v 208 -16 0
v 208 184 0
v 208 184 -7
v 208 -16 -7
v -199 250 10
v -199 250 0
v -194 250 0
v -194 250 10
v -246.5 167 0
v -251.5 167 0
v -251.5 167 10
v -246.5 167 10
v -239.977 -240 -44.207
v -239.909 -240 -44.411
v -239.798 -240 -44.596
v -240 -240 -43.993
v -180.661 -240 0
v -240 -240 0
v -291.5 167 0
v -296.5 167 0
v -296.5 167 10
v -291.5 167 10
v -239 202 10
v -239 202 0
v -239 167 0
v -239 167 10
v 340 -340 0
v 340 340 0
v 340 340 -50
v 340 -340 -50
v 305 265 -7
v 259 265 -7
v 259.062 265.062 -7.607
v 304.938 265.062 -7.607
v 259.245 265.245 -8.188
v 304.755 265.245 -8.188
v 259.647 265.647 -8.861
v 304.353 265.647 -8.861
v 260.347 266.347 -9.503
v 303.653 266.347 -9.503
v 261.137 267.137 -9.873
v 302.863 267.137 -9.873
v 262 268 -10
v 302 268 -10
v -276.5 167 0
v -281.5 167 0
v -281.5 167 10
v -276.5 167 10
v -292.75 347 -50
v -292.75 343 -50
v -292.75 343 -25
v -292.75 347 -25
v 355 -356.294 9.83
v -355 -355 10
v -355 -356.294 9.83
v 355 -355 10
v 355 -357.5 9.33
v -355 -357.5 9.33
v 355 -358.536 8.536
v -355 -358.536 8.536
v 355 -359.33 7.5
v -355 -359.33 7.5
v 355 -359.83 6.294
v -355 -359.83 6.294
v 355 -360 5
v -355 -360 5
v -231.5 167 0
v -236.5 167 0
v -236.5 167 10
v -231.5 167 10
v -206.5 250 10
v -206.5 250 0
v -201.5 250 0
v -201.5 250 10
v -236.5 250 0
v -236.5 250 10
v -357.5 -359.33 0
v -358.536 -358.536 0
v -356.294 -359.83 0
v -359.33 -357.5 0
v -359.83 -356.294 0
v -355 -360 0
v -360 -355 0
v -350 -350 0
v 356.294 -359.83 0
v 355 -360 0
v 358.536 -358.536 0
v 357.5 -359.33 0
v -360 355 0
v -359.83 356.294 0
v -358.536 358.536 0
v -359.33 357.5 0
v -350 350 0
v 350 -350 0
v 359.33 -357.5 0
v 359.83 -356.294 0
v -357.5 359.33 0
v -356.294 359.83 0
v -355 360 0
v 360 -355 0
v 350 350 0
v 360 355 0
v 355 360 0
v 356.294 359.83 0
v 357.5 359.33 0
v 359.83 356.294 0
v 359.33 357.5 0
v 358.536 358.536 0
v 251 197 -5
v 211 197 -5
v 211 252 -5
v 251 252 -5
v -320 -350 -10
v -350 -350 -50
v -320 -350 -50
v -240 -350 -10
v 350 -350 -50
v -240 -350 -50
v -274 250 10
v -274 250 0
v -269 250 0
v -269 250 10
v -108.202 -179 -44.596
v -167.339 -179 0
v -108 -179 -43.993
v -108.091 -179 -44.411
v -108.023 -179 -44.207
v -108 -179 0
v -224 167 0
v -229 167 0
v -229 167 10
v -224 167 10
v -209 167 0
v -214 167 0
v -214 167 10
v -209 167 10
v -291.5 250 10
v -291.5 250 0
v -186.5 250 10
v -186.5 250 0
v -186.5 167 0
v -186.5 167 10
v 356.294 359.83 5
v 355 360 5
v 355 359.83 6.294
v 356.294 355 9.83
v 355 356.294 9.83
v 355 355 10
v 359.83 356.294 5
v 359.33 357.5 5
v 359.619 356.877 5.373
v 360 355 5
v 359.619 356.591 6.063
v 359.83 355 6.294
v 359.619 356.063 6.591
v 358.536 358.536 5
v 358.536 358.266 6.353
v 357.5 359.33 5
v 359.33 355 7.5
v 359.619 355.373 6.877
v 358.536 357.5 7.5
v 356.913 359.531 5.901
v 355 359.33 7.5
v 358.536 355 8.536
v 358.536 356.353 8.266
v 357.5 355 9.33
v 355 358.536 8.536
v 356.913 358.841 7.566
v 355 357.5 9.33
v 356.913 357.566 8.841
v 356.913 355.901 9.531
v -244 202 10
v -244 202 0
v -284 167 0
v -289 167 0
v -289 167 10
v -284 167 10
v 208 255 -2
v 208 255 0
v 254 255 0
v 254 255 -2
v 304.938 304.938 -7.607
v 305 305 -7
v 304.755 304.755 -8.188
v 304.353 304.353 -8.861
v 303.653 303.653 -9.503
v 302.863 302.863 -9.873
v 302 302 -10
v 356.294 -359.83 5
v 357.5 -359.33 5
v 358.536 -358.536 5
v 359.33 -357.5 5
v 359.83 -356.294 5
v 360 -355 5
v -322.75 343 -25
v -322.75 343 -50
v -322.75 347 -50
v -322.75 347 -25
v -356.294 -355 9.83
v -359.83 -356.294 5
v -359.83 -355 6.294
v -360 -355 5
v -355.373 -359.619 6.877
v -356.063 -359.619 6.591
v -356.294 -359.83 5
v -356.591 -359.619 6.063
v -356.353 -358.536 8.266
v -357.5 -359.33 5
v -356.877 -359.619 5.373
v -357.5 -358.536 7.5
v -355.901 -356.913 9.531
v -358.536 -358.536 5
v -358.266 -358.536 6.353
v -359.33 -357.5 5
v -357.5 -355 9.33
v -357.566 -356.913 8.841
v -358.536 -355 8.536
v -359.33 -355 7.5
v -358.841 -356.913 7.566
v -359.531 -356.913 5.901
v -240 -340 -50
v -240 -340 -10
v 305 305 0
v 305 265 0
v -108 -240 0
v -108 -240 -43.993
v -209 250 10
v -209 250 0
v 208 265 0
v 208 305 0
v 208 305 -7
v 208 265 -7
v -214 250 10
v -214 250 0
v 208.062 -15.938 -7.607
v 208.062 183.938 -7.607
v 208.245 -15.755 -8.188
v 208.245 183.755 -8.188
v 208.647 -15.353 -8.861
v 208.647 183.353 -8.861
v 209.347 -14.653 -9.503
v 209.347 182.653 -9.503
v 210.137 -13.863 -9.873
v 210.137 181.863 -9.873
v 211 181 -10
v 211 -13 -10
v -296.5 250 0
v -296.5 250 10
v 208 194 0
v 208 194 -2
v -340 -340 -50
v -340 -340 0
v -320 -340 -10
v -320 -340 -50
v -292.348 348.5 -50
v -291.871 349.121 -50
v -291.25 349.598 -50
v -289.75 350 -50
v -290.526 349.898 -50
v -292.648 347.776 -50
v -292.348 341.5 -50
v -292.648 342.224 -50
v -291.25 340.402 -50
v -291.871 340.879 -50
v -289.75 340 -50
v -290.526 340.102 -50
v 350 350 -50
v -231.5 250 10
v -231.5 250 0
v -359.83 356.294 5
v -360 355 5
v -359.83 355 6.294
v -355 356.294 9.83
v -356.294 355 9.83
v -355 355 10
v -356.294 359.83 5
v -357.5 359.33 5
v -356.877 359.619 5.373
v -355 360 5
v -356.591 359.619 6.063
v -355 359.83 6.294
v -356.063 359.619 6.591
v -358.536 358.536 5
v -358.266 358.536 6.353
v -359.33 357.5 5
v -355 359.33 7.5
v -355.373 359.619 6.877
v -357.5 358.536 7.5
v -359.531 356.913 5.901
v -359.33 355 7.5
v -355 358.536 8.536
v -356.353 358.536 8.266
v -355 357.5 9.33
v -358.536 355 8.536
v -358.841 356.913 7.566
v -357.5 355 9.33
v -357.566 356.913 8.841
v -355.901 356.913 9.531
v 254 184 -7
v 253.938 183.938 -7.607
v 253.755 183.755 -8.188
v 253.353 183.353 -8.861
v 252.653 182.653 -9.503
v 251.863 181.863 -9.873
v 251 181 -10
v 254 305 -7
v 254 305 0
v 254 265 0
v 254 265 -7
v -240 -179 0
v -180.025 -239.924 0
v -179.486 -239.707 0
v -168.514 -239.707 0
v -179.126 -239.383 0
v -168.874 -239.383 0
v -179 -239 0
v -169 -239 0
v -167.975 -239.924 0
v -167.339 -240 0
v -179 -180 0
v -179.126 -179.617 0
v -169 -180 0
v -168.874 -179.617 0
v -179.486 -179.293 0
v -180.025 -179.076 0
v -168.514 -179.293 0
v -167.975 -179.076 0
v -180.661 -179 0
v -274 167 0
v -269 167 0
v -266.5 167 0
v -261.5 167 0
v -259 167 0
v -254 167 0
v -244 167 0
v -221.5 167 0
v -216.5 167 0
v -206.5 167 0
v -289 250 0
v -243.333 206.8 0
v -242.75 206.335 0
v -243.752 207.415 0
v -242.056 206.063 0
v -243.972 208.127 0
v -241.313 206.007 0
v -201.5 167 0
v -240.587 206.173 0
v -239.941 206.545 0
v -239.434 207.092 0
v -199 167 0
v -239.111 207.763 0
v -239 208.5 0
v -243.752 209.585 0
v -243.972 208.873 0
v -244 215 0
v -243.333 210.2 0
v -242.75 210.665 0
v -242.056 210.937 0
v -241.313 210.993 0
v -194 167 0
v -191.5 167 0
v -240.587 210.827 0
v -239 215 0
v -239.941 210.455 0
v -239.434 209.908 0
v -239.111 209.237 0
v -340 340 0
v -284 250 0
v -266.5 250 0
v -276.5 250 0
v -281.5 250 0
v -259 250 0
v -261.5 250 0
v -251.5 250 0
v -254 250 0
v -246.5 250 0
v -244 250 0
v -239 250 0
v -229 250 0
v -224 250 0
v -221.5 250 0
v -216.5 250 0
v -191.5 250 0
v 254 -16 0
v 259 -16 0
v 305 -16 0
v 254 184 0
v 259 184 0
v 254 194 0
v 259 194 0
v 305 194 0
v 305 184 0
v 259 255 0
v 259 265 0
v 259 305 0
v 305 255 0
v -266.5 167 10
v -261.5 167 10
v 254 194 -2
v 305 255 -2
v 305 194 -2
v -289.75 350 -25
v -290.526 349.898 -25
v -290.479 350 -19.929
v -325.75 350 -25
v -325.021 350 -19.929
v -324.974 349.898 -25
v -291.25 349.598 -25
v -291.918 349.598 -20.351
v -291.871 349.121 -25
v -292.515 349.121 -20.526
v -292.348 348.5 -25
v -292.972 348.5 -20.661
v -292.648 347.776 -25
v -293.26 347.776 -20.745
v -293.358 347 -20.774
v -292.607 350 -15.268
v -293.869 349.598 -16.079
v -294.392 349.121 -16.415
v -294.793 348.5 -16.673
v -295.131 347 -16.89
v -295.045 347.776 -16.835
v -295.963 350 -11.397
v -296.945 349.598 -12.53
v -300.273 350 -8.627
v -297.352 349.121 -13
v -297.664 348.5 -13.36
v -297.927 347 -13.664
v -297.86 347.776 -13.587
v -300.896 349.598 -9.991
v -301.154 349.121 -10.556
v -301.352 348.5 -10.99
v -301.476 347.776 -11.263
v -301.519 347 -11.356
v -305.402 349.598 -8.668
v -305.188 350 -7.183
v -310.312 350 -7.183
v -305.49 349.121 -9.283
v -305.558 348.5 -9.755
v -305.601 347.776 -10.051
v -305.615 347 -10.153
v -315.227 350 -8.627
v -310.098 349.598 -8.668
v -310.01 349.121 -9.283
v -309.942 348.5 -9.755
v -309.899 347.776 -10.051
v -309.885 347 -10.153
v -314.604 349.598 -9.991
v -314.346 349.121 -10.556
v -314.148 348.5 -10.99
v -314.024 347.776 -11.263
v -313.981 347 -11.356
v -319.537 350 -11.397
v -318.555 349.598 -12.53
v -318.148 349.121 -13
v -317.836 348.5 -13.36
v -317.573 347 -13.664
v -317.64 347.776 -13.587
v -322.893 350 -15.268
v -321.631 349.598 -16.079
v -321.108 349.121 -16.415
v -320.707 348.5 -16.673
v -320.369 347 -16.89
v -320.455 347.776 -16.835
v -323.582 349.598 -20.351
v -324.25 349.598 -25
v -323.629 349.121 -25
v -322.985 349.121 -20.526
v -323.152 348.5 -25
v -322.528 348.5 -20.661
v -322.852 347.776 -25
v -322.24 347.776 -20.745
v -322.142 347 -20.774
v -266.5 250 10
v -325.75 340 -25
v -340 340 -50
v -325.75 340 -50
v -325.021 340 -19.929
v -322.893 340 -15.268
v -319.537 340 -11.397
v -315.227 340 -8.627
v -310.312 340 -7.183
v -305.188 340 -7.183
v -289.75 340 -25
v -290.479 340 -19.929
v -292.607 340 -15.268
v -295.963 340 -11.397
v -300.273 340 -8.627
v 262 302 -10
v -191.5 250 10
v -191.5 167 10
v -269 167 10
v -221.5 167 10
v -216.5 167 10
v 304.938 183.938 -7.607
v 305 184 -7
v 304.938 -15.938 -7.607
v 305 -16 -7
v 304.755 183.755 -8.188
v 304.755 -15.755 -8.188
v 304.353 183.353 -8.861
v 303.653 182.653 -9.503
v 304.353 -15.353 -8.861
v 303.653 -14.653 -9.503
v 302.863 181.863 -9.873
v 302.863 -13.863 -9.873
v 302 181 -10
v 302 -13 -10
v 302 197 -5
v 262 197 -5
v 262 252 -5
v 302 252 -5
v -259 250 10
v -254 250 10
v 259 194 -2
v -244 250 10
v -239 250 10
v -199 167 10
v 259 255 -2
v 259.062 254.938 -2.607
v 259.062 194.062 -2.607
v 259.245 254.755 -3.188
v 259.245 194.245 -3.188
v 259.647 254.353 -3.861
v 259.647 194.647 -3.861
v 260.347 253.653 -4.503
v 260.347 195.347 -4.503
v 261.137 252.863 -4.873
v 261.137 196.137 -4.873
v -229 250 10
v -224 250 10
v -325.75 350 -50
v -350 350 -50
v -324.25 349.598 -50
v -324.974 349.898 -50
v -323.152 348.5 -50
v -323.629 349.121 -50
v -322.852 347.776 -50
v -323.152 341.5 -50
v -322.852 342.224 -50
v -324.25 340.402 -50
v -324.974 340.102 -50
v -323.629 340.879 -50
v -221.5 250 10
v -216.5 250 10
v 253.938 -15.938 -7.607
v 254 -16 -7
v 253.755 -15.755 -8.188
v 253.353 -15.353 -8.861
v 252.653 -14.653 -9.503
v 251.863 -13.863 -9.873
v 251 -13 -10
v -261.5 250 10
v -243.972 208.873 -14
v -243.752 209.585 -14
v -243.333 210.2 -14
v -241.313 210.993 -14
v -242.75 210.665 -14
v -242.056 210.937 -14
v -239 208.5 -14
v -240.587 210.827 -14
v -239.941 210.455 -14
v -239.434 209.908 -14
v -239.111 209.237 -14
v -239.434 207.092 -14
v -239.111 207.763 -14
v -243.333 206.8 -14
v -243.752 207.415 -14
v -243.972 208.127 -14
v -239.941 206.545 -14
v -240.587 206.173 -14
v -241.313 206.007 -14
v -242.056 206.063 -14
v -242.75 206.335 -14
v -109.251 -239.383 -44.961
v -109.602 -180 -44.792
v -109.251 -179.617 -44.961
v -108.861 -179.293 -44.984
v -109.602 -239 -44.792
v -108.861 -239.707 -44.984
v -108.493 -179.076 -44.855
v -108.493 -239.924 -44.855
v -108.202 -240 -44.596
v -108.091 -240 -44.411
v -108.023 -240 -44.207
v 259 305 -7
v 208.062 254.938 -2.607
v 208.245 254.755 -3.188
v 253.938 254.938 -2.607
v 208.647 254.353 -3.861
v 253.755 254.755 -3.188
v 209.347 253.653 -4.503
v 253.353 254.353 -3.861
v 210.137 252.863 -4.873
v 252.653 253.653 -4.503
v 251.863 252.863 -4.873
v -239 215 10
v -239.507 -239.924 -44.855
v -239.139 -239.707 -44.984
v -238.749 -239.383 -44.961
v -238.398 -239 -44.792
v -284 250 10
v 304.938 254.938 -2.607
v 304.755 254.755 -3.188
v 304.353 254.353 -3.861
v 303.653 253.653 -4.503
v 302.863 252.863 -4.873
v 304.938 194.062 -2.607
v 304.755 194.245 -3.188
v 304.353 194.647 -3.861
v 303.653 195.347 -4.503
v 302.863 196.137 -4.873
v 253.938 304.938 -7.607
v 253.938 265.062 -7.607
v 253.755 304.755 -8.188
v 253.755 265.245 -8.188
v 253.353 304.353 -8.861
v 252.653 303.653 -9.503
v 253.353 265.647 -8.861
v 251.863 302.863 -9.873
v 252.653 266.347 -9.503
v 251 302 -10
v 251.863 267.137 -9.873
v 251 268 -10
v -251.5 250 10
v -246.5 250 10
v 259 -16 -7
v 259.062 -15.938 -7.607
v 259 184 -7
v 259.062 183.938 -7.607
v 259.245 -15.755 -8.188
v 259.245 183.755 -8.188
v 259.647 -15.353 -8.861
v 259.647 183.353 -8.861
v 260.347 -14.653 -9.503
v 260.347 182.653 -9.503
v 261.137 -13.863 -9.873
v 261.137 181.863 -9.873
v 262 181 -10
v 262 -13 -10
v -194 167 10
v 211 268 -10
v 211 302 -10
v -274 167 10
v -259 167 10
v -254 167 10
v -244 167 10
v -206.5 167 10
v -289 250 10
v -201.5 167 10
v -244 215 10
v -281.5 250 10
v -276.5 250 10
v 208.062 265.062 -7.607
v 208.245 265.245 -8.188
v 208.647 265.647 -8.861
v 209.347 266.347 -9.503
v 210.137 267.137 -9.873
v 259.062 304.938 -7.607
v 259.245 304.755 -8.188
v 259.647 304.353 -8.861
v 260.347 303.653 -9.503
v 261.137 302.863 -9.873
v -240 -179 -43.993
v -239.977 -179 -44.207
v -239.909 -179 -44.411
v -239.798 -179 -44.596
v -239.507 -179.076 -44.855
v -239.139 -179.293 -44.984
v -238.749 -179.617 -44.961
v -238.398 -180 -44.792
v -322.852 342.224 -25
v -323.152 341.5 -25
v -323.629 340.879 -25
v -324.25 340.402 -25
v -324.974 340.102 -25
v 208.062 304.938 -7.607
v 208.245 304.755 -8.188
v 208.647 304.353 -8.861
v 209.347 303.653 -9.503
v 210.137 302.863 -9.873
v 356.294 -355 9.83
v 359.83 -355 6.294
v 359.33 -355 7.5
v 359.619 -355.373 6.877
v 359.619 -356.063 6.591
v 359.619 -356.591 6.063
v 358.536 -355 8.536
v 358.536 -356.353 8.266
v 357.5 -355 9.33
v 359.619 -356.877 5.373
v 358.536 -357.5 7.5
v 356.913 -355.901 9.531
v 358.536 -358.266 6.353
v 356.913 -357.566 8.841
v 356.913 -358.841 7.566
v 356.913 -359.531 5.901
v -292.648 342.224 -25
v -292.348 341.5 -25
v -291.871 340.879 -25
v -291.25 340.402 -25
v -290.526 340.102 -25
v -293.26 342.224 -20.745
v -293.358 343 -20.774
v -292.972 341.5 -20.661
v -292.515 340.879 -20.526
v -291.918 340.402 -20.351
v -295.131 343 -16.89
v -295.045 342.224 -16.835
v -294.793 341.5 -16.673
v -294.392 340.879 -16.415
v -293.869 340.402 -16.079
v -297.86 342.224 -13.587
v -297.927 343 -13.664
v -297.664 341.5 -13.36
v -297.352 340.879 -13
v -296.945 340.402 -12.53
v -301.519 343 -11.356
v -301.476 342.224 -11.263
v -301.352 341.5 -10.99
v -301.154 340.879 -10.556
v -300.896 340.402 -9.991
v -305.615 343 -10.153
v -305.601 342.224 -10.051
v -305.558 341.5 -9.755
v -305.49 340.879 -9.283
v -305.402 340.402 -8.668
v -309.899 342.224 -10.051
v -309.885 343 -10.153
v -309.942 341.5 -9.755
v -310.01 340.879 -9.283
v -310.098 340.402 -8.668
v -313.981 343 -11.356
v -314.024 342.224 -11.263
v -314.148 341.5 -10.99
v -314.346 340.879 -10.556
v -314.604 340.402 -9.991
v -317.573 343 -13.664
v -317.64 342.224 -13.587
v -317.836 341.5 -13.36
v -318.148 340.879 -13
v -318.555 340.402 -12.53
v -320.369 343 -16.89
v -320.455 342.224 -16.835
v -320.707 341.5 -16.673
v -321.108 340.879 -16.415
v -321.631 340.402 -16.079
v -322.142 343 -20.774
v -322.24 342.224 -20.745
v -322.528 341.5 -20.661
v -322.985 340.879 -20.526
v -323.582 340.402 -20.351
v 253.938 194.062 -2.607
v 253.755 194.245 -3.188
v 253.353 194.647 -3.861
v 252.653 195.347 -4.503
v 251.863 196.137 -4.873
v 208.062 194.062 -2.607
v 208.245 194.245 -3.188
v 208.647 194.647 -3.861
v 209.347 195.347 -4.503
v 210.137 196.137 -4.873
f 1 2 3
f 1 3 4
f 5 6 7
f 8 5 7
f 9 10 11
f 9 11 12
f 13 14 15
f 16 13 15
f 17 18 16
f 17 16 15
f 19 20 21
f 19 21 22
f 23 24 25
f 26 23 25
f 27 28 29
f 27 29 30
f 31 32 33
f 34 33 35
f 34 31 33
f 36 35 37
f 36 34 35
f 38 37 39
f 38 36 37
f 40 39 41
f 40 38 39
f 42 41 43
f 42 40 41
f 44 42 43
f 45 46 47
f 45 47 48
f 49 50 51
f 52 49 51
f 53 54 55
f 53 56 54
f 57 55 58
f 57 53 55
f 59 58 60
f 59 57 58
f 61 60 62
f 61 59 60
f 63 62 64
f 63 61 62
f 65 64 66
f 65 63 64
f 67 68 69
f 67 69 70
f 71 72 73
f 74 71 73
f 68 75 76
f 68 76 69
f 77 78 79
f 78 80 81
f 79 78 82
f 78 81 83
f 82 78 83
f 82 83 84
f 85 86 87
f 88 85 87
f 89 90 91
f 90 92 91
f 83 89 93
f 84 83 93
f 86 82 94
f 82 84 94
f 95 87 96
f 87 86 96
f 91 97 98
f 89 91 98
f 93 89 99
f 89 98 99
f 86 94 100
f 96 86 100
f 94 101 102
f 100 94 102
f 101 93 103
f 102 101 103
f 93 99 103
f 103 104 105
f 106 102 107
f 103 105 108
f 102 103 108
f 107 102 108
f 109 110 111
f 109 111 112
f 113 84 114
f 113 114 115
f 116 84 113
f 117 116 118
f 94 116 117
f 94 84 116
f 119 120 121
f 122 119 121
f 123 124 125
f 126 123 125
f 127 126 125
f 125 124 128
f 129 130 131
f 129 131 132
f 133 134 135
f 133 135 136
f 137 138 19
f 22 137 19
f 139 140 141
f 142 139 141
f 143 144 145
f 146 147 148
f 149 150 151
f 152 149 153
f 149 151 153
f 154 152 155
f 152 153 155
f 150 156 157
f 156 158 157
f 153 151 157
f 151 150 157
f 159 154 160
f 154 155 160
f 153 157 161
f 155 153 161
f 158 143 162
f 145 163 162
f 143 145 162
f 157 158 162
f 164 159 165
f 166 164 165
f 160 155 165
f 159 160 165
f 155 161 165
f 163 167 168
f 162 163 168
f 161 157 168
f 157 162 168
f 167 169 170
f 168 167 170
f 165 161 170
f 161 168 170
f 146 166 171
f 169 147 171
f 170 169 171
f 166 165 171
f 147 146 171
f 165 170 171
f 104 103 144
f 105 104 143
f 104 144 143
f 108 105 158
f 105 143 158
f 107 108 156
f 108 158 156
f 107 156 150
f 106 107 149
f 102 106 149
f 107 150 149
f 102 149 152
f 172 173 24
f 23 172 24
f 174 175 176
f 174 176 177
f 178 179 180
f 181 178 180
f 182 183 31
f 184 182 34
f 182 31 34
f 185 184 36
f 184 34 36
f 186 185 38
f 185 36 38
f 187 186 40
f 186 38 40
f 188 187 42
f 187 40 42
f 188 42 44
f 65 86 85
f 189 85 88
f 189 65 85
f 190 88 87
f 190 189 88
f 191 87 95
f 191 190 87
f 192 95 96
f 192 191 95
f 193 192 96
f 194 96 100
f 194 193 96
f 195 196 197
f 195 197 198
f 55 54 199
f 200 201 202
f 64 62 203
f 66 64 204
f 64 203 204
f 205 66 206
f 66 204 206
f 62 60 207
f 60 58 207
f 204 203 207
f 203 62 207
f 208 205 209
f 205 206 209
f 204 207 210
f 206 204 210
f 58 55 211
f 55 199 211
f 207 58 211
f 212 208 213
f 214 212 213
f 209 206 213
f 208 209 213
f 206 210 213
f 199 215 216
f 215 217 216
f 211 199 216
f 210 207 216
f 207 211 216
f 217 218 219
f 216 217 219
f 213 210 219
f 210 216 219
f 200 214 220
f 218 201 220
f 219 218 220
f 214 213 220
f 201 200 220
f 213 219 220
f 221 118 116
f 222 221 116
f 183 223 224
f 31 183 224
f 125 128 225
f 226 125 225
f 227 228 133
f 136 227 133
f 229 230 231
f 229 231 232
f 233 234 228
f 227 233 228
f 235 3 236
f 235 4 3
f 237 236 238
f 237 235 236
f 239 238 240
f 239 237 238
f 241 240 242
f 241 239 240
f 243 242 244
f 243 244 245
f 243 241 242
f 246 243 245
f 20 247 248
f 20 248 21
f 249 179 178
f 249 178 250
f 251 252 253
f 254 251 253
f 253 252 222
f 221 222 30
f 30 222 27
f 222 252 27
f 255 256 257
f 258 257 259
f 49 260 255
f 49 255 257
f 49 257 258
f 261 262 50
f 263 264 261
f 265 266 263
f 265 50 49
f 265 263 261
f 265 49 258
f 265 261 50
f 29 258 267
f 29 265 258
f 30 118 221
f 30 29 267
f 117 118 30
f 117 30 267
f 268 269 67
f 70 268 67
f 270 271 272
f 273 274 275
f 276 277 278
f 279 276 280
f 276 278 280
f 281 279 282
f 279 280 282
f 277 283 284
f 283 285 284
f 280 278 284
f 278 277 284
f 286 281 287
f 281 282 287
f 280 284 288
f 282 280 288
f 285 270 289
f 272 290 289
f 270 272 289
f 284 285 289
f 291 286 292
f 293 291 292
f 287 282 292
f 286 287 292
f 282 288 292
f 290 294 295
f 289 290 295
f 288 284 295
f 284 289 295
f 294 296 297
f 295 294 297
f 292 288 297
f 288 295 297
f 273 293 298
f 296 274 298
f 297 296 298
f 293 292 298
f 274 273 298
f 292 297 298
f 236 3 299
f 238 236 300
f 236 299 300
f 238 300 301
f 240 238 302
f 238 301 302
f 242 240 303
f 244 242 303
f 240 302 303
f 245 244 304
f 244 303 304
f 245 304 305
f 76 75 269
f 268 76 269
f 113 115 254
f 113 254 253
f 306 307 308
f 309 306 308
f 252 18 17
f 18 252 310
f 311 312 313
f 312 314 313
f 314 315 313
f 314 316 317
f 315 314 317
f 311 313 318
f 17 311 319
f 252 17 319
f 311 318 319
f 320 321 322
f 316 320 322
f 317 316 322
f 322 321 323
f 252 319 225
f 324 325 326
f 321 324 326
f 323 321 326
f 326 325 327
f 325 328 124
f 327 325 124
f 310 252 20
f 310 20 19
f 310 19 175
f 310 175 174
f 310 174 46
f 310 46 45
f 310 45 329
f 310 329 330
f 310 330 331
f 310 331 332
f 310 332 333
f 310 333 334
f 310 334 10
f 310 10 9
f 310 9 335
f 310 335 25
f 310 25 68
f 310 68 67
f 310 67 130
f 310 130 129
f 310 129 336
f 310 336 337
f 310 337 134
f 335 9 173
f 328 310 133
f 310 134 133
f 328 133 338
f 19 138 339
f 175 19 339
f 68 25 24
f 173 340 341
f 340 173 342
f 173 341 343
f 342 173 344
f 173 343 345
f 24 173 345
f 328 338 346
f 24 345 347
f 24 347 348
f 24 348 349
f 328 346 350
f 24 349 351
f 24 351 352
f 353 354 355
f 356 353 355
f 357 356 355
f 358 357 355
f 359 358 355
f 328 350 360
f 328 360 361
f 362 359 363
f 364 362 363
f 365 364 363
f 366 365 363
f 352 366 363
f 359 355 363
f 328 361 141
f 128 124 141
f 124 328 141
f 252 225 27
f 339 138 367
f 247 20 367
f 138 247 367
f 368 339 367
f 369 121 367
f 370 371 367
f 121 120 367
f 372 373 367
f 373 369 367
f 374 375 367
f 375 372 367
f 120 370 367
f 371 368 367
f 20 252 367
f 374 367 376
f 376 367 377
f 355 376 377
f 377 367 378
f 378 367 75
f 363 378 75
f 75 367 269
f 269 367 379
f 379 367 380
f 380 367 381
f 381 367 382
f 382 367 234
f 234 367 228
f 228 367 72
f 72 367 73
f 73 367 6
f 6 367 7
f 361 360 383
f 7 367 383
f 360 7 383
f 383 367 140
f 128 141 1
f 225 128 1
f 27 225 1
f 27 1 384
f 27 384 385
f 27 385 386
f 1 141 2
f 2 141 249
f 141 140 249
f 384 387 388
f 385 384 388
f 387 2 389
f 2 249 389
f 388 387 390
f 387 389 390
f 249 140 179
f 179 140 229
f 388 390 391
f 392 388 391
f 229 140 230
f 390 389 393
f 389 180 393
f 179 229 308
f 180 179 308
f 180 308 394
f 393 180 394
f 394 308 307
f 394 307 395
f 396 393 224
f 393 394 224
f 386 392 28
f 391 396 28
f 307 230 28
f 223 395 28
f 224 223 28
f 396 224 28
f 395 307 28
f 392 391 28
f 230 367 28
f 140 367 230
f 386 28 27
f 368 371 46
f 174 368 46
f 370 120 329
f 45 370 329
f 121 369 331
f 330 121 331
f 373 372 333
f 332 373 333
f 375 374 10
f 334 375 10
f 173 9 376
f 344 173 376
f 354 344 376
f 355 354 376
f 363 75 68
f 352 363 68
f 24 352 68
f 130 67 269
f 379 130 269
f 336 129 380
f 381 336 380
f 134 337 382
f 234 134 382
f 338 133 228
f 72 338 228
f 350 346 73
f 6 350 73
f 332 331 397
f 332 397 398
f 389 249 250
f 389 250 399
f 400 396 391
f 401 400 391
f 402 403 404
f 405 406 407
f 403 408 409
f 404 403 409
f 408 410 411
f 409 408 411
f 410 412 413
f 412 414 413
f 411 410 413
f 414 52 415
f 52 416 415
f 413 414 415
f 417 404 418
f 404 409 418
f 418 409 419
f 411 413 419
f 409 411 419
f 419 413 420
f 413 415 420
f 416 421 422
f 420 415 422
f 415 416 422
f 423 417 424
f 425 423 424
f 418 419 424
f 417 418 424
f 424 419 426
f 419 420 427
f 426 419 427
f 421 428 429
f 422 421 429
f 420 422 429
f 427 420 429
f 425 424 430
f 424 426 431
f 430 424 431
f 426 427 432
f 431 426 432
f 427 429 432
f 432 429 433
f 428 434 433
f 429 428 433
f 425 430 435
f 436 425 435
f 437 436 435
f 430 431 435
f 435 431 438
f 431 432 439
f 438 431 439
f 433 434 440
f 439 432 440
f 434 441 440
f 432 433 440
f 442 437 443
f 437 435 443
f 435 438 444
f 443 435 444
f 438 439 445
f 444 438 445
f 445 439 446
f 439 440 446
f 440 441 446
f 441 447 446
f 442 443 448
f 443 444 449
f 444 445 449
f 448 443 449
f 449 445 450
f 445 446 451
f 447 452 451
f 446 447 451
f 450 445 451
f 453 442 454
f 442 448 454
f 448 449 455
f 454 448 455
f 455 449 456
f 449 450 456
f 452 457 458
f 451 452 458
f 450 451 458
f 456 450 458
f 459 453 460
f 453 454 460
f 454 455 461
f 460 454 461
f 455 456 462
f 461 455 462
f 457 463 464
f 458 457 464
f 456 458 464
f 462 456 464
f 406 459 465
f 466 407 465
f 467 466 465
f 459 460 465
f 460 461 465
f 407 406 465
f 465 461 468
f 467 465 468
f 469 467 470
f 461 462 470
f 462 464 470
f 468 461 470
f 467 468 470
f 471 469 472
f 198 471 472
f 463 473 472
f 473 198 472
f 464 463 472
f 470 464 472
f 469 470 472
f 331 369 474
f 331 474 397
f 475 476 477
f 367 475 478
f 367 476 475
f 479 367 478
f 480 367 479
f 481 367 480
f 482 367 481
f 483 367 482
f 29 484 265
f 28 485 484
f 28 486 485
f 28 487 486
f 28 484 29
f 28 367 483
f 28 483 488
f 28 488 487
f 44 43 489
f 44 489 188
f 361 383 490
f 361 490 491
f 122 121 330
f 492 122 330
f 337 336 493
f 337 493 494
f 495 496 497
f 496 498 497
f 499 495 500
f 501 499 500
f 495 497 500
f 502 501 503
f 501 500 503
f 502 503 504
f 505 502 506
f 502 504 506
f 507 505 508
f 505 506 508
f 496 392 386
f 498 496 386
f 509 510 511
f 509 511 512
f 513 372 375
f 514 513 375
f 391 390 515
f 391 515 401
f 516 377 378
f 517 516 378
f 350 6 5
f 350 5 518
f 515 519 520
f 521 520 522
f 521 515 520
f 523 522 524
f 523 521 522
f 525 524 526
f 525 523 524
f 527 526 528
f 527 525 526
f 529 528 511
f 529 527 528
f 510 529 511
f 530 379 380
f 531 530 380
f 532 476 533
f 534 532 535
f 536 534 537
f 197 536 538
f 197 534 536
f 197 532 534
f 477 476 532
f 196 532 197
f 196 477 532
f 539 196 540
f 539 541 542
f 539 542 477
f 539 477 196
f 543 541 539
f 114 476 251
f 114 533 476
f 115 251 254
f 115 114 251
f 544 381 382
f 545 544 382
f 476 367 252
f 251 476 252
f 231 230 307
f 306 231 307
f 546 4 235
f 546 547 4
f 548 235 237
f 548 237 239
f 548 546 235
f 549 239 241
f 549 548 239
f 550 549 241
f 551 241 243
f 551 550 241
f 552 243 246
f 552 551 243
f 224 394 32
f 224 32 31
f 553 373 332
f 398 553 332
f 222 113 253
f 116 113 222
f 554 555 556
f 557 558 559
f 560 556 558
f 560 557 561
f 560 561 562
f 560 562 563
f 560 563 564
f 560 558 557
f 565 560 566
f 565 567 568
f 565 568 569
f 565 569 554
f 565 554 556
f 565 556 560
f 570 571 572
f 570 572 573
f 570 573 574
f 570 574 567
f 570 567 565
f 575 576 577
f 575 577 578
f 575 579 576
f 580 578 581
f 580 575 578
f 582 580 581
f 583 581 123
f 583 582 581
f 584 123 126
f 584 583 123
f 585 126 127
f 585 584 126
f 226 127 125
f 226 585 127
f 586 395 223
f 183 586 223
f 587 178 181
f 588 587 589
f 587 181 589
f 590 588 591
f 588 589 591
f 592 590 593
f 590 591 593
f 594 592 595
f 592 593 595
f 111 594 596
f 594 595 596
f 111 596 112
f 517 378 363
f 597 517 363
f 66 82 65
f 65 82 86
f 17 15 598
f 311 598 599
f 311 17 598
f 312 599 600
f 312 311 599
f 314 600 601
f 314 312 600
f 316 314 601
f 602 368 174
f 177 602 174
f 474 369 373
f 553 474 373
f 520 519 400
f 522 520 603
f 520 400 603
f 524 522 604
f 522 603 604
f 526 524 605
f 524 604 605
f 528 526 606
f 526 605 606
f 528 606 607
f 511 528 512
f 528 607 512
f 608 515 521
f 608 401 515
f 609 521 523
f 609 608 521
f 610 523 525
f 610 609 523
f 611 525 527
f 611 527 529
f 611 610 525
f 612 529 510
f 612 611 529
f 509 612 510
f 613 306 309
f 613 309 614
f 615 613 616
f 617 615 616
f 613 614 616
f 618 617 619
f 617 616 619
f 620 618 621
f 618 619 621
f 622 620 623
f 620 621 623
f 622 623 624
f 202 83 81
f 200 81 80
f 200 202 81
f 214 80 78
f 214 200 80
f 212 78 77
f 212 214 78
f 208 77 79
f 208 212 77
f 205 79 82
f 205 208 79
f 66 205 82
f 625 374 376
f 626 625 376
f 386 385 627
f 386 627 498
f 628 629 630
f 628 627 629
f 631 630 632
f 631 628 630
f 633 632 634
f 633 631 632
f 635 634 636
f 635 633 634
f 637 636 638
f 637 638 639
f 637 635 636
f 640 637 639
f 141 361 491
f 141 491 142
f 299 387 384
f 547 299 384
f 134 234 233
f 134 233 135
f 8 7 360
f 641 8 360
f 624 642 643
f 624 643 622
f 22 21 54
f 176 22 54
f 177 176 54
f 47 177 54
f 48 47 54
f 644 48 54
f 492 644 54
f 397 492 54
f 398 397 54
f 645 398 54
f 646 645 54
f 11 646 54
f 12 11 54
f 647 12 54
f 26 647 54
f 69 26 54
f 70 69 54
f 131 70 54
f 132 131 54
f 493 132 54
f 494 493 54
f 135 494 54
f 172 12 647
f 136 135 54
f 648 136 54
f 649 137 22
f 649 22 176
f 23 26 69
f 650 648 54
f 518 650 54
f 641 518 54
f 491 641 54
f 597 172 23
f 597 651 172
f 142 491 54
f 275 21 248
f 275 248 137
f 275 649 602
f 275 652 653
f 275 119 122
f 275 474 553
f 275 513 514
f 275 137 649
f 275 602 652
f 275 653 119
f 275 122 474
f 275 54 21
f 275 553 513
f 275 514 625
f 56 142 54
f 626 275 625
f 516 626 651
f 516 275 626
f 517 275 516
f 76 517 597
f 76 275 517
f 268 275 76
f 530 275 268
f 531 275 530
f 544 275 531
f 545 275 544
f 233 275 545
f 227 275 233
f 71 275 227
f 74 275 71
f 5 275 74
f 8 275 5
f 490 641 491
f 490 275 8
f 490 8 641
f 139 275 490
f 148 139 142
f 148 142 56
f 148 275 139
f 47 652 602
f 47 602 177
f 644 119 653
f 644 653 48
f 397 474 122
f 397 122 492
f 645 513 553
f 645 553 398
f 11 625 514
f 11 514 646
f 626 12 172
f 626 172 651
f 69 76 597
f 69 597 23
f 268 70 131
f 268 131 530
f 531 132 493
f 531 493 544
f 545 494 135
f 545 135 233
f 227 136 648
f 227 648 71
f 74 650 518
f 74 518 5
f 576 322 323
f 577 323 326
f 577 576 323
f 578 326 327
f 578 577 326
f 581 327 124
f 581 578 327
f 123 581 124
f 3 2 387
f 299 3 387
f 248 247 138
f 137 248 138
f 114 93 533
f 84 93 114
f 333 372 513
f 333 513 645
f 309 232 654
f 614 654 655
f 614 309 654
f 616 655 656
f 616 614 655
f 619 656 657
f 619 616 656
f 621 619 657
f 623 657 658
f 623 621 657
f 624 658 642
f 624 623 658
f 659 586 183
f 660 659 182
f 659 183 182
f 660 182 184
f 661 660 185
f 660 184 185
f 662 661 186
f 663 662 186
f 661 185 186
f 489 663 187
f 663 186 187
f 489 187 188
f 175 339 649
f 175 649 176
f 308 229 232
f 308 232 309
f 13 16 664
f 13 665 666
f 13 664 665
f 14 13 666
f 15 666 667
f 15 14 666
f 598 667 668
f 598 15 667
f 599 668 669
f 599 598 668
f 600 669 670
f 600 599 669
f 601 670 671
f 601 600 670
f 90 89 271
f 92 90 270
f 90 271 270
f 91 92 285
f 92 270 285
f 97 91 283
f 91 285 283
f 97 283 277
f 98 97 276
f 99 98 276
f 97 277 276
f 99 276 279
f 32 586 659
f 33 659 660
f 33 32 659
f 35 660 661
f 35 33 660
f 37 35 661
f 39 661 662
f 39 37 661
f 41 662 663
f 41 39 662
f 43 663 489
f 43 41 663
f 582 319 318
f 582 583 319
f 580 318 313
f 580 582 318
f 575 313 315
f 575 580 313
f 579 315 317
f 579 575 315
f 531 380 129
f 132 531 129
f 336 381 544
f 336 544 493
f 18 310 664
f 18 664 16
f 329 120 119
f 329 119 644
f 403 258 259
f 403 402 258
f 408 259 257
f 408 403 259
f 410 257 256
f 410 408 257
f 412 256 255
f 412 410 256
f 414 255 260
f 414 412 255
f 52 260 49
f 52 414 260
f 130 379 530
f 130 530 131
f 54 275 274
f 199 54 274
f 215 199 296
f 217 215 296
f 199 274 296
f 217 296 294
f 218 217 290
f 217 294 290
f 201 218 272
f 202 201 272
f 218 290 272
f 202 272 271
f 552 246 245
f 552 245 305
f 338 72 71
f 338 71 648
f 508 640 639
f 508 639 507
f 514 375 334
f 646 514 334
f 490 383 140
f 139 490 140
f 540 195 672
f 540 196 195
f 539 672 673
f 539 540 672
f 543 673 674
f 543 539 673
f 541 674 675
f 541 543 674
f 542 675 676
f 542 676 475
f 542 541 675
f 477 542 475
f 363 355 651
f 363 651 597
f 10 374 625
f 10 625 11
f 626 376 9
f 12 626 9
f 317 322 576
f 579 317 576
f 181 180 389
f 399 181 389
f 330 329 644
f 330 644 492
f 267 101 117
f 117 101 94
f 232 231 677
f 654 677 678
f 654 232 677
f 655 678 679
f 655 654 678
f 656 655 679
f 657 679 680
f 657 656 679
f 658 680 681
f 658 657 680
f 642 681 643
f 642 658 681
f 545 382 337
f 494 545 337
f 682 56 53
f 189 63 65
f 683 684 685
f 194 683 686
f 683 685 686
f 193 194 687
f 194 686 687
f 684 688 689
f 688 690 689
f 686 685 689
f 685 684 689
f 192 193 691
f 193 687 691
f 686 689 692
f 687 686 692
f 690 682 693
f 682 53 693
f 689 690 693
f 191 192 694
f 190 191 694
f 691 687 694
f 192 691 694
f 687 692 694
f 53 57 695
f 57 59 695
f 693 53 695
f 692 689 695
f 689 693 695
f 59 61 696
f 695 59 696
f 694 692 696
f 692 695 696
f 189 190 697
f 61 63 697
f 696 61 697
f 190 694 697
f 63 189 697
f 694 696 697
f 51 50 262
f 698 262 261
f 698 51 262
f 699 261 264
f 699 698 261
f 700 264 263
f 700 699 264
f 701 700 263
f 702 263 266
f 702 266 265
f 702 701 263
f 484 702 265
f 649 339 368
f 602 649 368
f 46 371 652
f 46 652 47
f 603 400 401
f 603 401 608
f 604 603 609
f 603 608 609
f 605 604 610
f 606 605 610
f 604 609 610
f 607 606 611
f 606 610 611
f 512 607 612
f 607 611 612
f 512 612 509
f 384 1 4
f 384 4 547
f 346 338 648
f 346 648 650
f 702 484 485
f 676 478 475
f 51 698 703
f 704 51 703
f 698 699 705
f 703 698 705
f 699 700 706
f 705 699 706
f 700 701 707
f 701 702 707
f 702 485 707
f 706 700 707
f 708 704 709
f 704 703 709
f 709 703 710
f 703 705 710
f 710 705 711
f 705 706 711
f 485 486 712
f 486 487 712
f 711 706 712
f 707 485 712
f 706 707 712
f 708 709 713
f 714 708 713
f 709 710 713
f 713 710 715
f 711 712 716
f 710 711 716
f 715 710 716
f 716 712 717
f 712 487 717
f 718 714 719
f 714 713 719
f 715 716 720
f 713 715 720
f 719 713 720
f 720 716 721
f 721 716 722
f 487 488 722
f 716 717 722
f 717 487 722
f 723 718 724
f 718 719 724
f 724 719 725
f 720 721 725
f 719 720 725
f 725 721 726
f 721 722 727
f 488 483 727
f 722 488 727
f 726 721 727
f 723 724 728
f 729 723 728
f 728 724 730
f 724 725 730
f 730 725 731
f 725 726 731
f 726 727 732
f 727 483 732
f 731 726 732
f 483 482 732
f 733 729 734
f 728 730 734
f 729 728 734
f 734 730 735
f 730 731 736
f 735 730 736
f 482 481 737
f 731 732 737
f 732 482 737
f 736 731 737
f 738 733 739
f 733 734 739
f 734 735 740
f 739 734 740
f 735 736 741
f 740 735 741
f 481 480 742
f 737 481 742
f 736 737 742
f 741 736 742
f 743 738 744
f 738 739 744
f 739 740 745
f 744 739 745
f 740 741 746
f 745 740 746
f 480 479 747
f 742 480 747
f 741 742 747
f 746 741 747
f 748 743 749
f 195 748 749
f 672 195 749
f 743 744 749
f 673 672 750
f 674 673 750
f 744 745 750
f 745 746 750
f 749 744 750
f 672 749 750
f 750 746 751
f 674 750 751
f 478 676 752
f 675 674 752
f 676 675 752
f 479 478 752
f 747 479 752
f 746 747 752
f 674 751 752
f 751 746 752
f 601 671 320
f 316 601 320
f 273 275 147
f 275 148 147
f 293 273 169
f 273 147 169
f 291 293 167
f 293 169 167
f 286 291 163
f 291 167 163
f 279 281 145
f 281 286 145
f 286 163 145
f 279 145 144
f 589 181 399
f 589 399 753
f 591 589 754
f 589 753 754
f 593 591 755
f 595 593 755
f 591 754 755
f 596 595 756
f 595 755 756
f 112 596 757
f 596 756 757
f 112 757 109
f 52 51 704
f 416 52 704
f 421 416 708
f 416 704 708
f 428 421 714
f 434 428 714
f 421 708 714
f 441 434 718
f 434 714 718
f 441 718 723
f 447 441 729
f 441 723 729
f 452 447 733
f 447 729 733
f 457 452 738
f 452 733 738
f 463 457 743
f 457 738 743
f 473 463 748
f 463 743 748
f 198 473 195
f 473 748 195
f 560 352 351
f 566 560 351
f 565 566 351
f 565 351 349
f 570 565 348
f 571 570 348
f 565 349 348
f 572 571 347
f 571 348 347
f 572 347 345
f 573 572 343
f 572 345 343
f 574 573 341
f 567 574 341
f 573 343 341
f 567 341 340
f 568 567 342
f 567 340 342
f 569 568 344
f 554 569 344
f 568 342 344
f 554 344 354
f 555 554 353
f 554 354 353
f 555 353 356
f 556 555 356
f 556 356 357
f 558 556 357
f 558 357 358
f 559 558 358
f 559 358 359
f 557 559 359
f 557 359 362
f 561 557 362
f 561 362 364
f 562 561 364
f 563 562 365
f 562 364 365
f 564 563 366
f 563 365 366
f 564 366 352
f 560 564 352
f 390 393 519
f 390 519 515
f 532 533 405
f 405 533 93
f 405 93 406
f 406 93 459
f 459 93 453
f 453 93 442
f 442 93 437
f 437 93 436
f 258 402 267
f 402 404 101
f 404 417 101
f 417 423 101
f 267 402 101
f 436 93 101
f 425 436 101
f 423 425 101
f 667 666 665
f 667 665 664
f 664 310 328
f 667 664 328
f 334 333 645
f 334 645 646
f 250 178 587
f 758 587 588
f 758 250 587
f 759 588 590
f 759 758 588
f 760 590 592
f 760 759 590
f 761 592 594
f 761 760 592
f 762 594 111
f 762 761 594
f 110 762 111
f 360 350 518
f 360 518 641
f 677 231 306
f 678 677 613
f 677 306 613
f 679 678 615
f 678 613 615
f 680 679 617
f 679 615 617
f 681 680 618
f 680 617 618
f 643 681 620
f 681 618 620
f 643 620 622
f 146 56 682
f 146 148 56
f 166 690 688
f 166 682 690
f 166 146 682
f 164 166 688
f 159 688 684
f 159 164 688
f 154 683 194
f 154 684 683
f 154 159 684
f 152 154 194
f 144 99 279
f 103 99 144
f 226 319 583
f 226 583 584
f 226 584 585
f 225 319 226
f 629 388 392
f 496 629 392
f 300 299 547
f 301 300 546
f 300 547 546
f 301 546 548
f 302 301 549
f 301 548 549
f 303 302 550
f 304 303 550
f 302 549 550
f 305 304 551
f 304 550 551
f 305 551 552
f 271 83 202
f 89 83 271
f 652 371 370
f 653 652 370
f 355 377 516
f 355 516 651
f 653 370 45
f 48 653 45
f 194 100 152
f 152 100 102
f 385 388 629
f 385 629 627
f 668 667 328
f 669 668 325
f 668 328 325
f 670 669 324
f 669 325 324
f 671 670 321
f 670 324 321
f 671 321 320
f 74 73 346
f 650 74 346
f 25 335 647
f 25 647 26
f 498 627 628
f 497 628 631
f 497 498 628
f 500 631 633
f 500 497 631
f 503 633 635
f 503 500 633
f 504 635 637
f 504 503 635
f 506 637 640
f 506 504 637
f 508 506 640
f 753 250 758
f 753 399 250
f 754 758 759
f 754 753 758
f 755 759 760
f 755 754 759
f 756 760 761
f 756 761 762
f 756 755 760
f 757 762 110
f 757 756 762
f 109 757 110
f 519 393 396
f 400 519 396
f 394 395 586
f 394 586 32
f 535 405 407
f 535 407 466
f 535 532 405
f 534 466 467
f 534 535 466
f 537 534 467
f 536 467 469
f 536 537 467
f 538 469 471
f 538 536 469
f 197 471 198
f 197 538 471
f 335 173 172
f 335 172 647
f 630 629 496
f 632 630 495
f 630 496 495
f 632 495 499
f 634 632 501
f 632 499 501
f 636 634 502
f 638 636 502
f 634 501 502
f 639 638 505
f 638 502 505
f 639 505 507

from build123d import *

# Parameters (mm, degrees)
SKETCH_W        = 720
SKETCH_H        = 720
PAD_DEPTH       = 10
SKETCH001_W     = 700
SKETCH001_H     = 700
SKETCH001_W_2   = 680
SKETCH001_H_2   = 680
PAD001_DEPTH    = 50
SKETCH002_W     = 46
SKETCH002_H     = 40
SKETCH002_H_2   = 200
PAD002_DEPTH    = 10
SKETCH003_W     = 46
SKETCH003_H     = 61
PAD003_DEPTH    = 5
SKETCH004_W     = 132
SKETCH004_H     = 61
PAD004_DEPTH    = 46
POCKET_DEPTH    = 61
SKETCH006_R     = 2.5
PAD005_DEPTH    = 14
POCKET001_DEPTH = 10
SKETCH008_W     = 5
SKETCH008_H     = 83
SKETCH008_H_2   = 35
POCKET002_DEPTH = 10
FILLET_R        = 3
FILLET001_R     = 3
FILLET002_R     = 1
FILLET003_R     = 5
SKETCH009_W     = 80
SKETCH009_H     = 40
POCKET003_DEPTH = 10


with BuildPart() as part:
    # Sketch → Pad (new body)
    with BuildSketch(Plane.XY):
        Rectangle(SKETCH_W, SKETCH_H)
    extrude(amount=PAD_DEPTH)

    # Sketch001 (on Face5 of Pad) → Pad001 (join)
    with BuildSketch(Plane(origin=(0, 0, 0), x_dir=(1, 0, 0), z_dir=(0, 0, -1))):
        Rectangle(SKETCH001_W, SKETCH001_H)
        Rectangle(SKETCH001_W_2, SKETCH001_H_2, mode=Mode.SUBTRACT)
    extrude(amount=PAD001_DEPTH)

    # Sketch002 (on Face16 of Pad001) → Pad002 (join)
    with BuildSketch(Plane(origin=(0, 0, 0), x_dir=(1, 0, 0), z_dir=(0, 0, -1))):
        with Locations((282, -285)):
            Rectangle(SKETCH002_W, SKETCH002_H)
        with Locations((231, -285)):
            Rectangle(SKETCH002_W, SKETCH002_H)
        with Locations((282, -84)):
            Rectangle(SKETCH002_W, SKETCH002_H_2)
        with Locations((231, -84)):
            Rectangle(SKETCH002_W, SKETCH002_H_2)
    extrude(amount=PAD002_DEPTH)

    # Sketch003 (on Face16 of Pad002) → Pad003 (join)
    with BuildSketch(Plane(origin=(0, 0, 0), x_dir=(1, 0, 0), z_dir=(0, 0, -1))):
        with Locations((231, -224.5)):
            Rectangle(SKETCH003_W, SKETCH003_H)
        with Locations((282, -224.5)):
            Rectangle(SKETCH003_W, SKETCH003_H)
    extrude(amount=PAD003_DEPTH)

    # Sketch004 (on Face16 of Pad003) → Pad004 (join)
    with BuildSketch(Plane(origin=(0, 0, 0), x_dir=(1, 0, 0), z_dir=(0, 0, -1))):
        with Locations((-174, 209.5)):
            Rectangle(SKETCH004_W, SKETCH004_H)
    extrude(amount=PAD004_DEPTH)

    # Sketch005 (on Face42 of Pad004) → Pocket (cut)
    with BuildSketch(Plane(origin=(0, -179, 0), x_dir=(-1, 0, 0), z_dir=(0, 1, 0))):
        Polygon((108, -46), (240, -46), (179, 0), (169, 0), align=None)
    extrude(amount=-POCKET_DEPTH, mode=Mode.SUBTRACT)

    # Sketch006 (on Face16 of Pocket) → Pad005 (join)
    with BuildSketch(Plane(origin=(0, 0, 0), x_dir=(1, 0, 0), z_dir=(0, 0, -1))):
        with Locations((-241.5, -208.5)):
            Circle(SKETCH006_R)
    extrude(amount=PAD005_DEPTH)

    # Sketch007 (on Face13 of Pad005) → Pocket001 (cut)
    with BuildSketch(Plane.XZ.offset(-340)):
        with BuildLine():
            ThreePointArc((-292.75, -25), (-307.75, -10), (-322.75, -25))
            Line((-322.75, -50), (-322.75, -25))
            Line((-322.75, -50), (-292.75, -50))
            Line((-292.75, -50), (-292.75, -25))
        make_face()
    extrude(amount=-POCKET001_DEPTH, mode=Mode.SUBTRACT)

    # Sketch008 (on Face19 of Pocket001) → Pocket002 (cut)
    with BuildSketch(Plane(origin=(0, 0, 0), x_dir=(1, 0, 0), z_dir=(0, 0, -1))):
        with Locations((-286.5, -208.5)):
            Rectangle(SKETCH008_W, SKETCH008_H)
        with Locations((-279, -208.5)):
            Rectangle(SKETCH008_W, SKETCH008_H)
        with Locations((-271.5, -208.5)):
            Rectangle(SKETCH008_W, SKETCH008_H)
        with Locations((-264, -208.5)):
            Rectangle(SKETCH008_W, SKETCH008_H)
        with Locations((-256.5, -208.5)):
            Rectangle(SKETCH008_W, SKETCH008_H)
        with Locations((-249, -208.5)):
            Rectangle(SKETCH008_W, SKETCH008_H)
        with Locations((-234, -208.5)):
            Rectangle(SKETCH008_W, SKETCH008_H)
        with Locations((-226.5, -208.5)):
            Rectangle(SKETCH008_W, SKETCH008_H)
        with Locations((-241.5, -184.5)):
            Rectangle(SKETCH008_W, SKETCH008_H_2)
        with Locations((-241.5, -232.5)):
            Rectangle(SKETCH008_W, SKETCH008_H_2)
        with Locations((-219, -208.5)):
            Rectangle(SKETCH008_W, SKETCH008_H)
        with Locations((-211.5, -208.5)):
            Rectangle(SKETCH008_W, SKETCH008_H)
        with Locations((-204, -208.5)):
            Rectangle(SKETCH008_W, SKETCH008_H)
        with Locations((-196.5, -208.5)):
            Rectangle(SKETCH008_W, SKETCH008_H)
        with Locations((-294, -208.5)):
            Rectangle(SKETCH008_W, SKETCH008_H)
        with Locations((-189, -208.5)):
            Rectangle(SKETCH008_W, SKETCH008_H)
    extrude(amount=-POCKET002_DEPTH, mode=Mode.SUBTRACT)

    # Fillet
    fillet_edges = [part.edges().sort_by_distance(p)[0] for p in [
        (-307.75, 340, -10),
        (-307.75, 350, -10),
        (-322.75, 340, -37.5),
        (-292.75, 340, -37.5),
        (-292.75, 350, -37.5),
        (-322.75, 350, -37.5),
    ]]
    fillet(fillet_edges, radius=FILLET_R)

    # Fillet001
    fillet001_edges = [part.edges().sort_by_distance(p)[0] for p in [
        (208, 285, -10),
        (231, 305, -10),
        (231, 265, -10),
        (254, 285, -10),
        (259, 285, -10),
        (282, 305, -10),
        (282, 265, -10),
        (305, 285, -10),
        (305, 224.5, -5),
        (282, 255, -5),
        (259, 224.5, -5),
        (282, 194, -5),
        (254, 224.5, -5),
        (231, 255, -5),
        (208, 224.5, -5),
        (231, 194, -5),
        (208, 84, -10),
        (231, 184, -10),
        (254, 84, -10),
        (231, -16, -10),
        (259, 84, -10),
        (282, -16, -10),
        (305, 84, -10),
        (282, 184, -10),
    ]]
    fillet(fillet001_edges, radius=FILLET001_R)

    # Fillet002
    fillet002_edges = [part.edges().sort_by_distance(p)[0] for p in [
        (-209.5, -179, -23),
        (-209.5, -240, -23),
        (-138.5, -179, -23),
        (-138.5, -240, -23),
        (-240, -209.5, -46),
        (-108, -209.5, -46),
    ]]
    fillet(fillet002_edges, radius=FILLET002_R)

    # Fillet003
    fillet003_edges = [part.edges().sort_by_distance(p)[0] for p in [
        (-360, 0, 10),
        (0, -360, 10),
        (-360, -360, 5),
        (-360, 360, 5),
        (0, 360, 10),
        (360, 360, 5),
        (360, 0, 10),
        (360, -360, 5),
    ]]
    fillet(fillet003_edges, radius=FILLET003_R)

    # Sketch009 (on Face123 of Fillet003) → Pocket003 (cut)
    with BuildSketch(Plane.XZ.offset(350)):
        with Locations((-280, -30)):
            Rectangle(SKETCH009_W, SKETCH009_H)
    extrude(amount=-POCKET003_DEPTH, mode=Mode.SUBTRACT)


solid = part.part
